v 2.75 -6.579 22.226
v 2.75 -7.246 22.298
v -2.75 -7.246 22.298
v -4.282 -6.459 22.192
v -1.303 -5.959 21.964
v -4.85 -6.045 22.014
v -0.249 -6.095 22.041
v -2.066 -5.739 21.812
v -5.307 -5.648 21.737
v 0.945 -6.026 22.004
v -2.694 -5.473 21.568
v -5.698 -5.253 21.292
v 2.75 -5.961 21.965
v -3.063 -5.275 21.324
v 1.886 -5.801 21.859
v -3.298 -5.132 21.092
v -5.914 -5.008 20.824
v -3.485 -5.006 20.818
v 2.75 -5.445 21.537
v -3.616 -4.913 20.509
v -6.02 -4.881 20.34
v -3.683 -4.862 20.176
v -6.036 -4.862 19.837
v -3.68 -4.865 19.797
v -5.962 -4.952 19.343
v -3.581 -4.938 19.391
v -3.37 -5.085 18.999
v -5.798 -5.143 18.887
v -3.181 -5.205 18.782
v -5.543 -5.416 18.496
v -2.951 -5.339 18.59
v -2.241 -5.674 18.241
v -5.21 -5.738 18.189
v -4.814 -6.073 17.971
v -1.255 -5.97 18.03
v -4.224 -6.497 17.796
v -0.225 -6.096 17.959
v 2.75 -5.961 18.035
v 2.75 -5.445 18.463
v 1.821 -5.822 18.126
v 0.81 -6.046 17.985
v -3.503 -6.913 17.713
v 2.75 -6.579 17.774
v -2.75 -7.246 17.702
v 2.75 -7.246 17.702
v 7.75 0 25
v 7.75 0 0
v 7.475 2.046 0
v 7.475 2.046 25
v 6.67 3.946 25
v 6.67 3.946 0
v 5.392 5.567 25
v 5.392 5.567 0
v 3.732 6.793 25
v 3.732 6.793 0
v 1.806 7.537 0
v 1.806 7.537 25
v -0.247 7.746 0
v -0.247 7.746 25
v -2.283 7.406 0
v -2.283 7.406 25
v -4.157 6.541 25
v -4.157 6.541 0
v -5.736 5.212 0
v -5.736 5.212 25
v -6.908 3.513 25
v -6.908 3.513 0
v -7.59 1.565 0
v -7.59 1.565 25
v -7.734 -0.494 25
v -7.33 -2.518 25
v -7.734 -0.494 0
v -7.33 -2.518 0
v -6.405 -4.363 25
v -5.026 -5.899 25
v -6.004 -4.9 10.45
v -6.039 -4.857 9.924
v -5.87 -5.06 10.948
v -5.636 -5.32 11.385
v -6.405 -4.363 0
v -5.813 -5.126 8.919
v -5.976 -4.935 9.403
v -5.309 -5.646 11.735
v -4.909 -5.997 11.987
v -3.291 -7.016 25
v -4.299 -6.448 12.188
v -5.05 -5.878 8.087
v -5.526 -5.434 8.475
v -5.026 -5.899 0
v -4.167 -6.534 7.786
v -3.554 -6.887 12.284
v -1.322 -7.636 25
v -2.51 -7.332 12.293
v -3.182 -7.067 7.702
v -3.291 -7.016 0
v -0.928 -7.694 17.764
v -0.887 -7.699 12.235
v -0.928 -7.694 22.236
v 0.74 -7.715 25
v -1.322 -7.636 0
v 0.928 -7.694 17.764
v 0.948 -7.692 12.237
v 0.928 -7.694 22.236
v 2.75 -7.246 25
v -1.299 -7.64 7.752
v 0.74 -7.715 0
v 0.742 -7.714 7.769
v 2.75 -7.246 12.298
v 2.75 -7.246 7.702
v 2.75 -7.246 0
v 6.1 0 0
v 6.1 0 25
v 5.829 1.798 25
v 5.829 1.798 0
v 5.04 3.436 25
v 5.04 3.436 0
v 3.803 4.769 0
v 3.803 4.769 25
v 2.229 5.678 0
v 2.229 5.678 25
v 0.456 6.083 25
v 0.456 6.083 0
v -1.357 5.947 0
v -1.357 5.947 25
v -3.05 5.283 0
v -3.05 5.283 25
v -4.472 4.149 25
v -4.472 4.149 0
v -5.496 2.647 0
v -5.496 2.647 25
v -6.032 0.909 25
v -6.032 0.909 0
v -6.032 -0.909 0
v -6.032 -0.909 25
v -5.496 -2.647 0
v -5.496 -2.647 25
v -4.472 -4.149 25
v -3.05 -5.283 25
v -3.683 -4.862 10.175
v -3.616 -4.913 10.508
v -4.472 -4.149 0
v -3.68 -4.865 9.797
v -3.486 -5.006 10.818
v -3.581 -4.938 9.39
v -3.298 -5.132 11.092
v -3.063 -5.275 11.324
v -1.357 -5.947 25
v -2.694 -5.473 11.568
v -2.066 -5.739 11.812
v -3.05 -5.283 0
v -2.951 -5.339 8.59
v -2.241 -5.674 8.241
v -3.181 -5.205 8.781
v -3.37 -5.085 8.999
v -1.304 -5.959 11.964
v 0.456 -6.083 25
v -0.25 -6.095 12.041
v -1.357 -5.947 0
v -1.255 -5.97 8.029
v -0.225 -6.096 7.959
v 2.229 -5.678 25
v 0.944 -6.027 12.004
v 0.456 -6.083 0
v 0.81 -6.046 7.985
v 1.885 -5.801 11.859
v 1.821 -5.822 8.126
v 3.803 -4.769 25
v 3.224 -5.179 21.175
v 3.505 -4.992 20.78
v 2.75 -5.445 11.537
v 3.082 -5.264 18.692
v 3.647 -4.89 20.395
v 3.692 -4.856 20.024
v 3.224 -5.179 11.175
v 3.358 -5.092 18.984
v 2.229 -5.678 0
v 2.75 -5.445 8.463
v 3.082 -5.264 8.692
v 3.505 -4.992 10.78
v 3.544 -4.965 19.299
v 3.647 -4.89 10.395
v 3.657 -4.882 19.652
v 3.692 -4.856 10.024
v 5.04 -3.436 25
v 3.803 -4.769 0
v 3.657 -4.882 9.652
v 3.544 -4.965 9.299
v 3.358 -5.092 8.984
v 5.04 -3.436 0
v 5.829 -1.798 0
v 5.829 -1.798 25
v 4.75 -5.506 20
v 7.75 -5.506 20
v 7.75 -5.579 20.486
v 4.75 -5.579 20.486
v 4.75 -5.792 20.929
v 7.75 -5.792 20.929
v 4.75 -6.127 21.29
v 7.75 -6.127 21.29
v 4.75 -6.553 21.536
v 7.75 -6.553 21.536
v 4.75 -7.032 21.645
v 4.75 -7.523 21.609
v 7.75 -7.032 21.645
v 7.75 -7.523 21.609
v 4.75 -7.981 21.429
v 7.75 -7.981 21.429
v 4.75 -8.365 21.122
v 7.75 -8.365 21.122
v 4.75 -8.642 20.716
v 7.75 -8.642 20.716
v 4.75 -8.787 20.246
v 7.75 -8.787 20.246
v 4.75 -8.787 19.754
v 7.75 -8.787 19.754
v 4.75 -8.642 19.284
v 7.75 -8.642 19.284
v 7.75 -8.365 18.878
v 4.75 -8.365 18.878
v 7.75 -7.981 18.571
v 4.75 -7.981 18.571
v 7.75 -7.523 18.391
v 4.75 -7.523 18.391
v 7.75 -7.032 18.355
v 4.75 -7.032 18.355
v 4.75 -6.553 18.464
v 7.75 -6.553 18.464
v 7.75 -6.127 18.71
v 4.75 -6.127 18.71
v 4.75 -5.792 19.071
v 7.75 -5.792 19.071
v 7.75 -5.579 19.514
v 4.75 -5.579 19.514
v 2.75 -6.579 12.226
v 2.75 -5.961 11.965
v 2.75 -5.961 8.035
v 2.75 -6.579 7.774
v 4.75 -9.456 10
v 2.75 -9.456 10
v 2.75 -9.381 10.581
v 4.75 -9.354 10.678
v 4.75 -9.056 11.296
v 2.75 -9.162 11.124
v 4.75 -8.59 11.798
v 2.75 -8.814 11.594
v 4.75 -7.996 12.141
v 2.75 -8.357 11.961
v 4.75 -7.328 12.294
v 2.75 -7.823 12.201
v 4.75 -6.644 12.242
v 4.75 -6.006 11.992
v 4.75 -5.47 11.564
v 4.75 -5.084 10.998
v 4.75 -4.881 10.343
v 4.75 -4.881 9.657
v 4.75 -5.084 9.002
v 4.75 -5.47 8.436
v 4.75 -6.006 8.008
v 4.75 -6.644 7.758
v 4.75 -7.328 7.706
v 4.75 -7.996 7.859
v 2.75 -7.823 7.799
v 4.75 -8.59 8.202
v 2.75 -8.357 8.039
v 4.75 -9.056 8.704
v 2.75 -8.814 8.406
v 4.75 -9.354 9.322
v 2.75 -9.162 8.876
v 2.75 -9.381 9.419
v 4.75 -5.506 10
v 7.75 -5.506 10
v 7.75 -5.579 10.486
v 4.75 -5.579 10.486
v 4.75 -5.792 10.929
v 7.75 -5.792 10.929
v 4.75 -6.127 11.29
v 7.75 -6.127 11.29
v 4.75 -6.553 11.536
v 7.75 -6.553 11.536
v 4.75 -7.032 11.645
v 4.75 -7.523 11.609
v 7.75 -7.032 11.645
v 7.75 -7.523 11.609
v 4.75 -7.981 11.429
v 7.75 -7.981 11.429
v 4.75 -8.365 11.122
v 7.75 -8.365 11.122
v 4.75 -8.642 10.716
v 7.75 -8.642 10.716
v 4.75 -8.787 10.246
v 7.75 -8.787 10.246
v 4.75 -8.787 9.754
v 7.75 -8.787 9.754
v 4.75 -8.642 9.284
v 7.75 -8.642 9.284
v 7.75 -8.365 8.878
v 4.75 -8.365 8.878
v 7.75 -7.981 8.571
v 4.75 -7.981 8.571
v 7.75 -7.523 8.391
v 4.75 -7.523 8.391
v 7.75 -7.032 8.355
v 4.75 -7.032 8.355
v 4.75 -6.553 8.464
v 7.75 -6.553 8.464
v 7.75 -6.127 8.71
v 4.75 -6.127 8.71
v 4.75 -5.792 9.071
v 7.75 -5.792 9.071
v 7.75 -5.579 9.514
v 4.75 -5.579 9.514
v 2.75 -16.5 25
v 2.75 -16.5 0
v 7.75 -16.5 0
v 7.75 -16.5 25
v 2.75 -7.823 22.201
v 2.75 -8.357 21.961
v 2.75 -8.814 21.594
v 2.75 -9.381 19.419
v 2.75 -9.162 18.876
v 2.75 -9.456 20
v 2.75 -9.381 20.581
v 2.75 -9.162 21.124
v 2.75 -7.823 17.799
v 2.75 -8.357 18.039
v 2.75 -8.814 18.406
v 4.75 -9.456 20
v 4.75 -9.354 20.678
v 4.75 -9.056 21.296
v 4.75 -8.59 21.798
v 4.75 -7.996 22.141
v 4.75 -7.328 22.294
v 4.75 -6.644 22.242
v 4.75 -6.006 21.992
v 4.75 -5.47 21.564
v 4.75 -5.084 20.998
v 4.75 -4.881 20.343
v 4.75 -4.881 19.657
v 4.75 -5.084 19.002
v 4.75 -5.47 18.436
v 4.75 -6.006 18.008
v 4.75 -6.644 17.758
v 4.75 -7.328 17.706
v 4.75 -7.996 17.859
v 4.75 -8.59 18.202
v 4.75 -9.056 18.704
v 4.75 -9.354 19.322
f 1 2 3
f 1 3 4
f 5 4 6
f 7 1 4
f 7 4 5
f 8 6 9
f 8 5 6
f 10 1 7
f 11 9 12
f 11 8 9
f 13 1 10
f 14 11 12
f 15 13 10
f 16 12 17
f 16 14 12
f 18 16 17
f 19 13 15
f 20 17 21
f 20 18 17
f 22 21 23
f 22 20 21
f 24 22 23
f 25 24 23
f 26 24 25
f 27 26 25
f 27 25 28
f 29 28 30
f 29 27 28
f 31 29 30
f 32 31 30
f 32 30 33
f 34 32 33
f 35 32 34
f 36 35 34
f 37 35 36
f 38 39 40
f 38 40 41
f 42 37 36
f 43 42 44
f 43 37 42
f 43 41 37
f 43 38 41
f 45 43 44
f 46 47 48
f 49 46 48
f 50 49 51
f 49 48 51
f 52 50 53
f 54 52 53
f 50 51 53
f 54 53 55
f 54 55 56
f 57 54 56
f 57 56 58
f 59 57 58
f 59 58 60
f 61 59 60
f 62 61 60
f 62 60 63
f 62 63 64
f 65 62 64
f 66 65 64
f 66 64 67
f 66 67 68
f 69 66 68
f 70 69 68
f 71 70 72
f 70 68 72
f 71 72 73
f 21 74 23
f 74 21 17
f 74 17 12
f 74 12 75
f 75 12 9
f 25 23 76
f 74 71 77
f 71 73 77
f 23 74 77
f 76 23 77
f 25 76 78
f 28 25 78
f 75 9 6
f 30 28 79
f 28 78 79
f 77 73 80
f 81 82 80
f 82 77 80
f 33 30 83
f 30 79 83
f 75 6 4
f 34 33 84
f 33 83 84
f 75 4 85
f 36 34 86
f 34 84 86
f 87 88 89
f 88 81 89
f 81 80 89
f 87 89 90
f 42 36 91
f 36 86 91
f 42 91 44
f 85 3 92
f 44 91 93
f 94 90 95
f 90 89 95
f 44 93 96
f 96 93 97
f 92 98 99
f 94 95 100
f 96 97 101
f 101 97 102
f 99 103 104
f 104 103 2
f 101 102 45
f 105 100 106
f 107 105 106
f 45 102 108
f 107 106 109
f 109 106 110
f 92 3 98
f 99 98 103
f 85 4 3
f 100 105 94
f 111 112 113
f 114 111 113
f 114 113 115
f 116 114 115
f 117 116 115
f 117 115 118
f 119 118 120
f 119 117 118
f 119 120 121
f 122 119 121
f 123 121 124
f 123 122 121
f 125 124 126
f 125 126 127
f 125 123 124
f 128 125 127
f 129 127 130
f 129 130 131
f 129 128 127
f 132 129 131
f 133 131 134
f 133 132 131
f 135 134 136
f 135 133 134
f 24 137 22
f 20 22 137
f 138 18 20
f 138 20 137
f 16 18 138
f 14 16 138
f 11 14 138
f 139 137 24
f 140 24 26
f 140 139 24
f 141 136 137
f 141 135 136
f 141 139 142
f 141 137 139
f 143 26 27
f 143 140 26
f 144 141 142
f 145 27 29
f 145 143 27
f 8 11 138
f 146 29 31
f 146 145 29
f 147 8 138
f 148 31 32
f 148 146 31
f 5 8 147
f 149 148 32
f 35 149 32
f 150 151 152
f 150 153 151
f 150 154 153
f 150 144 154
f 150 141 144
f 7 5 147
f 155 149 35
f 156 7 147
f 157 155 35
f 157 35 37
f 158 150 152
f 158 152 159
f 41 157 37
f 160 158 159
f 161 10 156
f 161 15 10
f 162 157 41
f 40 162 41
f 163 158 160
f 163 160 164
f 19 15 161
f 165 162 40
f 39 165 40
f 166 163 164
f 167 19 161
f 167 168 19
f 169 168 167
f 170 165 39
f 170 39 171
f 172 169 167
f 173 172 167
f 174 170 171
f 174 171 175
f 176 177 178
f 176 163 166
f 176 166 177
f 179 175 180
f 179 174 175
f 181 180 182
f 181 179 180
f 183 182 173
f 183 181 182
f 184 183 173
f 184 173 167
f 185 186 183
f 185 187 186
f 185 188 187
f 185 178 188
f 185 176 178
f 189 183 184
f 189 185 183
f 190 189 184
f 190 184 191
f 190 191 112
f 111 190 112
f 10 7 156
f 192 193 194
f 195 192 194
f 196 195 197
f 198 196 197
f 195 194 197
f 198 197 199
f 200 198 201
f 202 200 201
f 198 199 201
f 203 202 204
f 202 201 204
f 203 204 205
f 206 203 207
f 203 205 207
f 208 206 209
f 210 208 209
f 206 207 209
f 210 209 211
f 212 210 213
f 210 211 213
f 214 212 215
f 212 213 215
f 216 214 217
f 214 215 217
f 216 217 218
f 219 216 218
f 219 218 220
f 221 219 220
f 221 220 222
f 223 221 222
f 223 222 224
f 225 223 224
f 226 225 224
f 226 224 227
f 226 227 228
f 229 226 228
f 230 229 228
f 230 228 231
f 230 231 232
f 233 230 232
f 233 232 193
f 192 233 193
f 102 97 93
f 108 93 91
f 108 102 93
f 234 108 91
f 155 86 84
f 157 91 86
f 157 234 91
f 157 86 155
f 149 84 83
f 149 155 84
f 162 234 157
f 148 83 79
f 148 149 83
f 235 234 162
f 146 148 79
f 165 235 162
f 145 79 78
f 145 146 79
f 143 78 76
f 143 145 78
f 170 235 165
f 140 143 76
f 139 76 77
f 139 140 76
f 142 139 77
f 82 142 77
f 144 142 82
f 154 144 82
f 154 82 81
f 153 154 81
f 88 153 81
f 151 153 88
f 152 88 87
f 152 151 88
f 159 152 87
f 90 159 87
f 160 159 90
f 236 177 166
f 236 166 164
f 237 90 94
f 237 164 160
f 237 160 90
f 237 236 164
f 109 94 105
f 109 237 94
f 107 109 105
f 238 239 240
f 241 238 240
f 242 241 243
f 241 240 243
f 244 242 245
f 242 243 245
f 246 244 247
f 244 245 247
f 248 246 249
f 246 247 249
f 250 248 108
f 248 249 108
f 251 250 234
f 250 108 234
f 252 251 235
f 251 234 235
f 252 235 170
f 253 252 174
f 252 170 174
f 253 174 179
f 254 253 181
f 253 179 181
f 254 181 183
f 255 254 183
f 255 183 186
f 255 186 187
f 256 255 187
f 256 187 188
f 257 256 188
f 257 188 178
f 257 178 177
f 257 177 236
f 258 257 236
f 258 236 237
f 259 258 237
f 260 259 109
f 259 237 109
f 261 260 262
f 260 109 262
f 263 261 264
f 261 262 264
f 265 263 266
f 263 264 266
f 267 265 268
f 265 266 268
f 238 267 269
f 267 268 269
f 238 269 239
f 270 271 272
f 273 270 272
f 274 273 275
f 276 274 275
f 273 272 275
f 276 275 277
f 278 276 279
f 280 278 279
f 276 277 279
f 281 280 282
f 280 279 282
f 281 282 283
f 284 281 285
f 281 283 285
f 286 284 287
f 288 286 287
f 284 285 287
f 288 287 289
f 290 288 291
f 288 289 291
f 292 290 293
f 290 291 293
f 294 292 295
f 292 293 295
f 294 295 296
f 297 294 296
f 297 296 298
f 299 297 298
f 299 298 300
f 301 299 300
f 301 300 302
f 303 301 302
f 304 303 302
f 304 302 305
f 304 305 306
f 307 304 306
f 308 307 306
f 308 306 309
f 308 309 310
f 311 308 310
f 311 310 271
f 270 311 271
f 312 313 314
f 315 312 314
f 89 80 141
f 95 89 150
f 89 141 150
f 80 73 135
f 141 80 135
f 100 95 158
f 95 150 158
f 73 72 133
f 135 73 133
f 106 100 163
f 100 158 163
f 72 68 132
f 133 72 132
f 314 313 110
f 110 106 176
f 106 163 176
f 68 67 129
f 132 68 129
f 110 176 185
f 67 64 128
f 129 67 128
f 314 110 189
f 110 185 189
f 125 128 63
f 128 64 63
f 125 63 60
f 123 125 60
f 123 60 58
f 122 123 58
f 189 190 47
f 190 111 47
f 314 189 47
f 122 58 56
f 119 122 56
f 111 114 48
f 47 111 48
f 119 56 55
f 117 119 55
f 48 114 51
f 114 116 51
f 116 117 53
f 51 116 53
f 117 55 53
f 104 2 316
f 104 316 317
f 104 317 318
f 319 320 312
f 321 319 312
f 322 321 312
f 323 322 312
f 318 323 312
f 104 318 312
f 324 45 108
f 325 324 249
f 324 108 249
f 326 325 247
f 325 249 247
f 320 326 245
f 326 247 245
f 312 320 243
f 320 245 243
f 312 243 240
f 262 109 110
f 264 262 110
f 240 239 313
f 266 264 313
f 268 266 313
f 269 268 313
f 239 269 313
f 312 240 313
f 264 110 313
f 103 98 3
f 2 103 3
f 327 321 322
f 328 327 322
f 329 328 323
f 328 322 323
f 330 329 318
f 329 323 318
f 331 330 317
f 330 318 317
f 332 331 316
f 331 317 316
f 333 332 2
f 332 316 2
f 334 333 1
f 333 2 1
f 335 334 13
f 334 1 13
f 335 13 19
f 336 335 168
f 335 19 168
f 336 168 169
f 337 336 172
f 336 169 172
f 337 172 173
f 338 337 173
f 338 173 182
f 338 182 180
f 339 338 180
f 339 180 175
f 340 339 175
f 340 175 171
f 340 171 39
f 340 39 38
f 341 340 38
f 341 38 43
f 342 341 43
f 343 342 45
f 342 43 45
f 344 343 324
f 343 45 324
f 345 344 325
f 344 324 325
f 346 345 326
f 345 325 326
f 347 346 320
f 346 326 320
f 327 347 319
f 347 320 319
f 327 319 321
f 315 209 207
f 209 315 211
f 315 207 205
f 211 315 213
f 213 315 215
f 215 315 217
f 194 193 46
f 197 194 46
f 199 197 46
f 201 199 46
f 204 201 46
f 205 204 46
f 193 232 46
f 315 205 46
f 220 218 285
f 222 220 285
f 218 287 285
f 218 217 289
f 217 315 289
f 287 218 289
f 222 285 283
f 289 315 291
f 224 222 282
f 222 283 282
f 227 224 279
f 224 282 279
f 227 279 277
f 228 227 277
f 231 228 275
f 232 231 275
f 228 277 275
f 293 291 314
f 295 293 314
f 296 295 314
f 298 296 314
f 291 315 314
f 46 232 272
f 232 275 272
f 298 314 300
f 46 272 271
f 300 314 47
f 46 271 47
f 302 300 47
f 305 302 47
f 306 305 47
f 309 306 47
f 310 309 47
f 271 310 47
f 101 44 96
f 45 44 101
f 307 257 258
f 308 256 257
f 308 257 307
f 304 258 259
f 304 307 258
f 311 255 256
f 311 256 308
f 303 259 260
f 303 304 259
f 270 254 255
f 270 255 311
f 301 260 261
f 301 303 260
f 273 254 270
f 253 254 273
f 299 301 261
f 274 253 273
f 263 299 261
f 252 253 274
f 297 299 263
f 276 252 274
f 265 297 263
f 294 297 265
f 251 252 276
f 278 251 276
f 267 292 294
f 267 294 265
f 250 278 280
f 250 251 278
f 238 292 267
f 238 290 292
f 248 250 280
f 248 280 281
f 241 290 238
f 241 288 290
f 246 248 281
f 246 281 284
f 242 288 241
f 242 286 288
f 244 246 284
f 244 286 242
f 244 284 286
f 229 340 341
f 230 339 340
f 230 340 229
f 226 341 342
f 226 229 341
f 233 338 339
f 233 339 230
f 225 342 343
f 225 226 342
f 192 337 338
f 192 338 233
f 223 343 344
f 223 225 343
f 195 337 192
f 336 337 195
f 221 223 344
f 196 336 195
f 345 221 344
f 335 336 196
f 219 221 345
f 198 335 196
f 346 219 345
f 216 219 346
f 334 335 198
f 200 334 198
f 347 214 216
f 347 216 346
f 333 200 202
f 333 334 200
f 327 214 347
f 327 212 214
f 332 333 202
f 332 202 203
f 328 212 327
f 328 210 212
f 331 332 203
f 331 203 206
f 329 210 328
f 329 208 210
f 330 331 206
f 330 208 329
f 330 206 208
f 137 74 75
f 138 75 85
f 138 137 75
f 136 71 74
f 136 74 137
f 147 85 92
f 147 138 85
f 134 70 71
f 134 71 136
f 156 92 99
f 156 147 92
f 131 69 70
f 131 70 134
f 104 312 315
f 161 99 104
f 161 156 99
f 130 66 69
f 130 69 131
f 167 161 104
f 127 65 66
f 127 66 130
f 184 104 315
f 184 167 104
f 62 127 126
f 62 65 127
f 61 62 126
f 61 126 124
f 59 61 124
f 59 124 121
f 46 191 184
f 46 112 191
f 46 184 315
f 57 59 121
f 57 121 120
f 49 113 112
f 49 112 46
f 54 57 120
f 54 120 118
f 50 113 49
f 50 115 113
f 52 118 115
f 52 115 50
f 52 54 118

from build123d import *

# Parameters (mm, degrees)
F0_R     = 6.1
F1_DEPTH = 25
F2_R     = 2.3
F3_DEPTH = 25
F4_DEPTH = 2
F5_D     = 3.3


with BuildPart() as f1:
    # F0 (on Top) → F1 (new body)
    with BuildSketch(Plane.XY):
        with BuildLine():
            ThreePointArc((2.75, -7.2456883731), (6.3786754111, -4.4017042154), (7.75, 0))
            ThreePointArc((7.75, 0), (-6.3786754111, 4.4017042154), (2.75, -7.2456883731))
        make_face()
        Circle(F0_R, mode=Mode.SUBTRACT)
        with BuildLine():
            Line((7.75, -16.5), (7.75, 0))
            ThreePointArc((7.75, 0), (6.3786754111, -4.4017042154), (2.75, -7.2456883731))
            Line((2.75, -7.2456883731), (2.75, -16.5))
            Line((2.75, -16.5), (7.75, -16.5))
        make_face()
    extrude(amount=F1_DEPTH)

    # F2 (on face) → F3 (cut)
    with BuildSketch(Plane(origin=(2.75, 0, 0), x_dir=(0, -1, 0), z_dir=(-1, 0, 0))):
        with BuildLine():
            ThreePointArc((7.2456883731, 17.7017590841), (8.8135894847, 18.4057690674), (9.4557512134, 20))
            ThreePointArc((9.4557512134, 20), (8.8135894847, 21.5942309326), (7.2456883731, 22.2982409159))
            Line((7.2456883731, 22.2982409159), (7.2456883731, 17.7017590841))
        make_face()
        with Locations((7.1557512134, 20)):
            Circle(F2_R)
        with Locations((7.1557512134, 10)):
            Circle(F2_R)
    extrude(amount=F3_DEPTH, mode=Mode.SUBTRACT)

    # F2 (on face) → F4 (cut)
    with BuildSketch(Plane(origin=(2.75, 0, 0), x_dir=(0, -1, 0), z_dir=(-1, 0, 0))):
        with Locations((7.1557512134, 20)):
            Circle(F2_R)
        with Locations((7.1557512134, 10)):
            Circle(F2_R)
    extrude(amount=-F4_DEPTH, mode=Mode.SUBTRACT)

    # F5 (through all)
    with Locations(Plane(origin=(2.75, 0, 0), x_dir=(0, -1, 0), z_dir=(-1, 0, 0))):
        with Locations((7.1557512134, 10), (7.1557512134, 20)):
            Hole(F5_D / 2)


solid = f1.part
